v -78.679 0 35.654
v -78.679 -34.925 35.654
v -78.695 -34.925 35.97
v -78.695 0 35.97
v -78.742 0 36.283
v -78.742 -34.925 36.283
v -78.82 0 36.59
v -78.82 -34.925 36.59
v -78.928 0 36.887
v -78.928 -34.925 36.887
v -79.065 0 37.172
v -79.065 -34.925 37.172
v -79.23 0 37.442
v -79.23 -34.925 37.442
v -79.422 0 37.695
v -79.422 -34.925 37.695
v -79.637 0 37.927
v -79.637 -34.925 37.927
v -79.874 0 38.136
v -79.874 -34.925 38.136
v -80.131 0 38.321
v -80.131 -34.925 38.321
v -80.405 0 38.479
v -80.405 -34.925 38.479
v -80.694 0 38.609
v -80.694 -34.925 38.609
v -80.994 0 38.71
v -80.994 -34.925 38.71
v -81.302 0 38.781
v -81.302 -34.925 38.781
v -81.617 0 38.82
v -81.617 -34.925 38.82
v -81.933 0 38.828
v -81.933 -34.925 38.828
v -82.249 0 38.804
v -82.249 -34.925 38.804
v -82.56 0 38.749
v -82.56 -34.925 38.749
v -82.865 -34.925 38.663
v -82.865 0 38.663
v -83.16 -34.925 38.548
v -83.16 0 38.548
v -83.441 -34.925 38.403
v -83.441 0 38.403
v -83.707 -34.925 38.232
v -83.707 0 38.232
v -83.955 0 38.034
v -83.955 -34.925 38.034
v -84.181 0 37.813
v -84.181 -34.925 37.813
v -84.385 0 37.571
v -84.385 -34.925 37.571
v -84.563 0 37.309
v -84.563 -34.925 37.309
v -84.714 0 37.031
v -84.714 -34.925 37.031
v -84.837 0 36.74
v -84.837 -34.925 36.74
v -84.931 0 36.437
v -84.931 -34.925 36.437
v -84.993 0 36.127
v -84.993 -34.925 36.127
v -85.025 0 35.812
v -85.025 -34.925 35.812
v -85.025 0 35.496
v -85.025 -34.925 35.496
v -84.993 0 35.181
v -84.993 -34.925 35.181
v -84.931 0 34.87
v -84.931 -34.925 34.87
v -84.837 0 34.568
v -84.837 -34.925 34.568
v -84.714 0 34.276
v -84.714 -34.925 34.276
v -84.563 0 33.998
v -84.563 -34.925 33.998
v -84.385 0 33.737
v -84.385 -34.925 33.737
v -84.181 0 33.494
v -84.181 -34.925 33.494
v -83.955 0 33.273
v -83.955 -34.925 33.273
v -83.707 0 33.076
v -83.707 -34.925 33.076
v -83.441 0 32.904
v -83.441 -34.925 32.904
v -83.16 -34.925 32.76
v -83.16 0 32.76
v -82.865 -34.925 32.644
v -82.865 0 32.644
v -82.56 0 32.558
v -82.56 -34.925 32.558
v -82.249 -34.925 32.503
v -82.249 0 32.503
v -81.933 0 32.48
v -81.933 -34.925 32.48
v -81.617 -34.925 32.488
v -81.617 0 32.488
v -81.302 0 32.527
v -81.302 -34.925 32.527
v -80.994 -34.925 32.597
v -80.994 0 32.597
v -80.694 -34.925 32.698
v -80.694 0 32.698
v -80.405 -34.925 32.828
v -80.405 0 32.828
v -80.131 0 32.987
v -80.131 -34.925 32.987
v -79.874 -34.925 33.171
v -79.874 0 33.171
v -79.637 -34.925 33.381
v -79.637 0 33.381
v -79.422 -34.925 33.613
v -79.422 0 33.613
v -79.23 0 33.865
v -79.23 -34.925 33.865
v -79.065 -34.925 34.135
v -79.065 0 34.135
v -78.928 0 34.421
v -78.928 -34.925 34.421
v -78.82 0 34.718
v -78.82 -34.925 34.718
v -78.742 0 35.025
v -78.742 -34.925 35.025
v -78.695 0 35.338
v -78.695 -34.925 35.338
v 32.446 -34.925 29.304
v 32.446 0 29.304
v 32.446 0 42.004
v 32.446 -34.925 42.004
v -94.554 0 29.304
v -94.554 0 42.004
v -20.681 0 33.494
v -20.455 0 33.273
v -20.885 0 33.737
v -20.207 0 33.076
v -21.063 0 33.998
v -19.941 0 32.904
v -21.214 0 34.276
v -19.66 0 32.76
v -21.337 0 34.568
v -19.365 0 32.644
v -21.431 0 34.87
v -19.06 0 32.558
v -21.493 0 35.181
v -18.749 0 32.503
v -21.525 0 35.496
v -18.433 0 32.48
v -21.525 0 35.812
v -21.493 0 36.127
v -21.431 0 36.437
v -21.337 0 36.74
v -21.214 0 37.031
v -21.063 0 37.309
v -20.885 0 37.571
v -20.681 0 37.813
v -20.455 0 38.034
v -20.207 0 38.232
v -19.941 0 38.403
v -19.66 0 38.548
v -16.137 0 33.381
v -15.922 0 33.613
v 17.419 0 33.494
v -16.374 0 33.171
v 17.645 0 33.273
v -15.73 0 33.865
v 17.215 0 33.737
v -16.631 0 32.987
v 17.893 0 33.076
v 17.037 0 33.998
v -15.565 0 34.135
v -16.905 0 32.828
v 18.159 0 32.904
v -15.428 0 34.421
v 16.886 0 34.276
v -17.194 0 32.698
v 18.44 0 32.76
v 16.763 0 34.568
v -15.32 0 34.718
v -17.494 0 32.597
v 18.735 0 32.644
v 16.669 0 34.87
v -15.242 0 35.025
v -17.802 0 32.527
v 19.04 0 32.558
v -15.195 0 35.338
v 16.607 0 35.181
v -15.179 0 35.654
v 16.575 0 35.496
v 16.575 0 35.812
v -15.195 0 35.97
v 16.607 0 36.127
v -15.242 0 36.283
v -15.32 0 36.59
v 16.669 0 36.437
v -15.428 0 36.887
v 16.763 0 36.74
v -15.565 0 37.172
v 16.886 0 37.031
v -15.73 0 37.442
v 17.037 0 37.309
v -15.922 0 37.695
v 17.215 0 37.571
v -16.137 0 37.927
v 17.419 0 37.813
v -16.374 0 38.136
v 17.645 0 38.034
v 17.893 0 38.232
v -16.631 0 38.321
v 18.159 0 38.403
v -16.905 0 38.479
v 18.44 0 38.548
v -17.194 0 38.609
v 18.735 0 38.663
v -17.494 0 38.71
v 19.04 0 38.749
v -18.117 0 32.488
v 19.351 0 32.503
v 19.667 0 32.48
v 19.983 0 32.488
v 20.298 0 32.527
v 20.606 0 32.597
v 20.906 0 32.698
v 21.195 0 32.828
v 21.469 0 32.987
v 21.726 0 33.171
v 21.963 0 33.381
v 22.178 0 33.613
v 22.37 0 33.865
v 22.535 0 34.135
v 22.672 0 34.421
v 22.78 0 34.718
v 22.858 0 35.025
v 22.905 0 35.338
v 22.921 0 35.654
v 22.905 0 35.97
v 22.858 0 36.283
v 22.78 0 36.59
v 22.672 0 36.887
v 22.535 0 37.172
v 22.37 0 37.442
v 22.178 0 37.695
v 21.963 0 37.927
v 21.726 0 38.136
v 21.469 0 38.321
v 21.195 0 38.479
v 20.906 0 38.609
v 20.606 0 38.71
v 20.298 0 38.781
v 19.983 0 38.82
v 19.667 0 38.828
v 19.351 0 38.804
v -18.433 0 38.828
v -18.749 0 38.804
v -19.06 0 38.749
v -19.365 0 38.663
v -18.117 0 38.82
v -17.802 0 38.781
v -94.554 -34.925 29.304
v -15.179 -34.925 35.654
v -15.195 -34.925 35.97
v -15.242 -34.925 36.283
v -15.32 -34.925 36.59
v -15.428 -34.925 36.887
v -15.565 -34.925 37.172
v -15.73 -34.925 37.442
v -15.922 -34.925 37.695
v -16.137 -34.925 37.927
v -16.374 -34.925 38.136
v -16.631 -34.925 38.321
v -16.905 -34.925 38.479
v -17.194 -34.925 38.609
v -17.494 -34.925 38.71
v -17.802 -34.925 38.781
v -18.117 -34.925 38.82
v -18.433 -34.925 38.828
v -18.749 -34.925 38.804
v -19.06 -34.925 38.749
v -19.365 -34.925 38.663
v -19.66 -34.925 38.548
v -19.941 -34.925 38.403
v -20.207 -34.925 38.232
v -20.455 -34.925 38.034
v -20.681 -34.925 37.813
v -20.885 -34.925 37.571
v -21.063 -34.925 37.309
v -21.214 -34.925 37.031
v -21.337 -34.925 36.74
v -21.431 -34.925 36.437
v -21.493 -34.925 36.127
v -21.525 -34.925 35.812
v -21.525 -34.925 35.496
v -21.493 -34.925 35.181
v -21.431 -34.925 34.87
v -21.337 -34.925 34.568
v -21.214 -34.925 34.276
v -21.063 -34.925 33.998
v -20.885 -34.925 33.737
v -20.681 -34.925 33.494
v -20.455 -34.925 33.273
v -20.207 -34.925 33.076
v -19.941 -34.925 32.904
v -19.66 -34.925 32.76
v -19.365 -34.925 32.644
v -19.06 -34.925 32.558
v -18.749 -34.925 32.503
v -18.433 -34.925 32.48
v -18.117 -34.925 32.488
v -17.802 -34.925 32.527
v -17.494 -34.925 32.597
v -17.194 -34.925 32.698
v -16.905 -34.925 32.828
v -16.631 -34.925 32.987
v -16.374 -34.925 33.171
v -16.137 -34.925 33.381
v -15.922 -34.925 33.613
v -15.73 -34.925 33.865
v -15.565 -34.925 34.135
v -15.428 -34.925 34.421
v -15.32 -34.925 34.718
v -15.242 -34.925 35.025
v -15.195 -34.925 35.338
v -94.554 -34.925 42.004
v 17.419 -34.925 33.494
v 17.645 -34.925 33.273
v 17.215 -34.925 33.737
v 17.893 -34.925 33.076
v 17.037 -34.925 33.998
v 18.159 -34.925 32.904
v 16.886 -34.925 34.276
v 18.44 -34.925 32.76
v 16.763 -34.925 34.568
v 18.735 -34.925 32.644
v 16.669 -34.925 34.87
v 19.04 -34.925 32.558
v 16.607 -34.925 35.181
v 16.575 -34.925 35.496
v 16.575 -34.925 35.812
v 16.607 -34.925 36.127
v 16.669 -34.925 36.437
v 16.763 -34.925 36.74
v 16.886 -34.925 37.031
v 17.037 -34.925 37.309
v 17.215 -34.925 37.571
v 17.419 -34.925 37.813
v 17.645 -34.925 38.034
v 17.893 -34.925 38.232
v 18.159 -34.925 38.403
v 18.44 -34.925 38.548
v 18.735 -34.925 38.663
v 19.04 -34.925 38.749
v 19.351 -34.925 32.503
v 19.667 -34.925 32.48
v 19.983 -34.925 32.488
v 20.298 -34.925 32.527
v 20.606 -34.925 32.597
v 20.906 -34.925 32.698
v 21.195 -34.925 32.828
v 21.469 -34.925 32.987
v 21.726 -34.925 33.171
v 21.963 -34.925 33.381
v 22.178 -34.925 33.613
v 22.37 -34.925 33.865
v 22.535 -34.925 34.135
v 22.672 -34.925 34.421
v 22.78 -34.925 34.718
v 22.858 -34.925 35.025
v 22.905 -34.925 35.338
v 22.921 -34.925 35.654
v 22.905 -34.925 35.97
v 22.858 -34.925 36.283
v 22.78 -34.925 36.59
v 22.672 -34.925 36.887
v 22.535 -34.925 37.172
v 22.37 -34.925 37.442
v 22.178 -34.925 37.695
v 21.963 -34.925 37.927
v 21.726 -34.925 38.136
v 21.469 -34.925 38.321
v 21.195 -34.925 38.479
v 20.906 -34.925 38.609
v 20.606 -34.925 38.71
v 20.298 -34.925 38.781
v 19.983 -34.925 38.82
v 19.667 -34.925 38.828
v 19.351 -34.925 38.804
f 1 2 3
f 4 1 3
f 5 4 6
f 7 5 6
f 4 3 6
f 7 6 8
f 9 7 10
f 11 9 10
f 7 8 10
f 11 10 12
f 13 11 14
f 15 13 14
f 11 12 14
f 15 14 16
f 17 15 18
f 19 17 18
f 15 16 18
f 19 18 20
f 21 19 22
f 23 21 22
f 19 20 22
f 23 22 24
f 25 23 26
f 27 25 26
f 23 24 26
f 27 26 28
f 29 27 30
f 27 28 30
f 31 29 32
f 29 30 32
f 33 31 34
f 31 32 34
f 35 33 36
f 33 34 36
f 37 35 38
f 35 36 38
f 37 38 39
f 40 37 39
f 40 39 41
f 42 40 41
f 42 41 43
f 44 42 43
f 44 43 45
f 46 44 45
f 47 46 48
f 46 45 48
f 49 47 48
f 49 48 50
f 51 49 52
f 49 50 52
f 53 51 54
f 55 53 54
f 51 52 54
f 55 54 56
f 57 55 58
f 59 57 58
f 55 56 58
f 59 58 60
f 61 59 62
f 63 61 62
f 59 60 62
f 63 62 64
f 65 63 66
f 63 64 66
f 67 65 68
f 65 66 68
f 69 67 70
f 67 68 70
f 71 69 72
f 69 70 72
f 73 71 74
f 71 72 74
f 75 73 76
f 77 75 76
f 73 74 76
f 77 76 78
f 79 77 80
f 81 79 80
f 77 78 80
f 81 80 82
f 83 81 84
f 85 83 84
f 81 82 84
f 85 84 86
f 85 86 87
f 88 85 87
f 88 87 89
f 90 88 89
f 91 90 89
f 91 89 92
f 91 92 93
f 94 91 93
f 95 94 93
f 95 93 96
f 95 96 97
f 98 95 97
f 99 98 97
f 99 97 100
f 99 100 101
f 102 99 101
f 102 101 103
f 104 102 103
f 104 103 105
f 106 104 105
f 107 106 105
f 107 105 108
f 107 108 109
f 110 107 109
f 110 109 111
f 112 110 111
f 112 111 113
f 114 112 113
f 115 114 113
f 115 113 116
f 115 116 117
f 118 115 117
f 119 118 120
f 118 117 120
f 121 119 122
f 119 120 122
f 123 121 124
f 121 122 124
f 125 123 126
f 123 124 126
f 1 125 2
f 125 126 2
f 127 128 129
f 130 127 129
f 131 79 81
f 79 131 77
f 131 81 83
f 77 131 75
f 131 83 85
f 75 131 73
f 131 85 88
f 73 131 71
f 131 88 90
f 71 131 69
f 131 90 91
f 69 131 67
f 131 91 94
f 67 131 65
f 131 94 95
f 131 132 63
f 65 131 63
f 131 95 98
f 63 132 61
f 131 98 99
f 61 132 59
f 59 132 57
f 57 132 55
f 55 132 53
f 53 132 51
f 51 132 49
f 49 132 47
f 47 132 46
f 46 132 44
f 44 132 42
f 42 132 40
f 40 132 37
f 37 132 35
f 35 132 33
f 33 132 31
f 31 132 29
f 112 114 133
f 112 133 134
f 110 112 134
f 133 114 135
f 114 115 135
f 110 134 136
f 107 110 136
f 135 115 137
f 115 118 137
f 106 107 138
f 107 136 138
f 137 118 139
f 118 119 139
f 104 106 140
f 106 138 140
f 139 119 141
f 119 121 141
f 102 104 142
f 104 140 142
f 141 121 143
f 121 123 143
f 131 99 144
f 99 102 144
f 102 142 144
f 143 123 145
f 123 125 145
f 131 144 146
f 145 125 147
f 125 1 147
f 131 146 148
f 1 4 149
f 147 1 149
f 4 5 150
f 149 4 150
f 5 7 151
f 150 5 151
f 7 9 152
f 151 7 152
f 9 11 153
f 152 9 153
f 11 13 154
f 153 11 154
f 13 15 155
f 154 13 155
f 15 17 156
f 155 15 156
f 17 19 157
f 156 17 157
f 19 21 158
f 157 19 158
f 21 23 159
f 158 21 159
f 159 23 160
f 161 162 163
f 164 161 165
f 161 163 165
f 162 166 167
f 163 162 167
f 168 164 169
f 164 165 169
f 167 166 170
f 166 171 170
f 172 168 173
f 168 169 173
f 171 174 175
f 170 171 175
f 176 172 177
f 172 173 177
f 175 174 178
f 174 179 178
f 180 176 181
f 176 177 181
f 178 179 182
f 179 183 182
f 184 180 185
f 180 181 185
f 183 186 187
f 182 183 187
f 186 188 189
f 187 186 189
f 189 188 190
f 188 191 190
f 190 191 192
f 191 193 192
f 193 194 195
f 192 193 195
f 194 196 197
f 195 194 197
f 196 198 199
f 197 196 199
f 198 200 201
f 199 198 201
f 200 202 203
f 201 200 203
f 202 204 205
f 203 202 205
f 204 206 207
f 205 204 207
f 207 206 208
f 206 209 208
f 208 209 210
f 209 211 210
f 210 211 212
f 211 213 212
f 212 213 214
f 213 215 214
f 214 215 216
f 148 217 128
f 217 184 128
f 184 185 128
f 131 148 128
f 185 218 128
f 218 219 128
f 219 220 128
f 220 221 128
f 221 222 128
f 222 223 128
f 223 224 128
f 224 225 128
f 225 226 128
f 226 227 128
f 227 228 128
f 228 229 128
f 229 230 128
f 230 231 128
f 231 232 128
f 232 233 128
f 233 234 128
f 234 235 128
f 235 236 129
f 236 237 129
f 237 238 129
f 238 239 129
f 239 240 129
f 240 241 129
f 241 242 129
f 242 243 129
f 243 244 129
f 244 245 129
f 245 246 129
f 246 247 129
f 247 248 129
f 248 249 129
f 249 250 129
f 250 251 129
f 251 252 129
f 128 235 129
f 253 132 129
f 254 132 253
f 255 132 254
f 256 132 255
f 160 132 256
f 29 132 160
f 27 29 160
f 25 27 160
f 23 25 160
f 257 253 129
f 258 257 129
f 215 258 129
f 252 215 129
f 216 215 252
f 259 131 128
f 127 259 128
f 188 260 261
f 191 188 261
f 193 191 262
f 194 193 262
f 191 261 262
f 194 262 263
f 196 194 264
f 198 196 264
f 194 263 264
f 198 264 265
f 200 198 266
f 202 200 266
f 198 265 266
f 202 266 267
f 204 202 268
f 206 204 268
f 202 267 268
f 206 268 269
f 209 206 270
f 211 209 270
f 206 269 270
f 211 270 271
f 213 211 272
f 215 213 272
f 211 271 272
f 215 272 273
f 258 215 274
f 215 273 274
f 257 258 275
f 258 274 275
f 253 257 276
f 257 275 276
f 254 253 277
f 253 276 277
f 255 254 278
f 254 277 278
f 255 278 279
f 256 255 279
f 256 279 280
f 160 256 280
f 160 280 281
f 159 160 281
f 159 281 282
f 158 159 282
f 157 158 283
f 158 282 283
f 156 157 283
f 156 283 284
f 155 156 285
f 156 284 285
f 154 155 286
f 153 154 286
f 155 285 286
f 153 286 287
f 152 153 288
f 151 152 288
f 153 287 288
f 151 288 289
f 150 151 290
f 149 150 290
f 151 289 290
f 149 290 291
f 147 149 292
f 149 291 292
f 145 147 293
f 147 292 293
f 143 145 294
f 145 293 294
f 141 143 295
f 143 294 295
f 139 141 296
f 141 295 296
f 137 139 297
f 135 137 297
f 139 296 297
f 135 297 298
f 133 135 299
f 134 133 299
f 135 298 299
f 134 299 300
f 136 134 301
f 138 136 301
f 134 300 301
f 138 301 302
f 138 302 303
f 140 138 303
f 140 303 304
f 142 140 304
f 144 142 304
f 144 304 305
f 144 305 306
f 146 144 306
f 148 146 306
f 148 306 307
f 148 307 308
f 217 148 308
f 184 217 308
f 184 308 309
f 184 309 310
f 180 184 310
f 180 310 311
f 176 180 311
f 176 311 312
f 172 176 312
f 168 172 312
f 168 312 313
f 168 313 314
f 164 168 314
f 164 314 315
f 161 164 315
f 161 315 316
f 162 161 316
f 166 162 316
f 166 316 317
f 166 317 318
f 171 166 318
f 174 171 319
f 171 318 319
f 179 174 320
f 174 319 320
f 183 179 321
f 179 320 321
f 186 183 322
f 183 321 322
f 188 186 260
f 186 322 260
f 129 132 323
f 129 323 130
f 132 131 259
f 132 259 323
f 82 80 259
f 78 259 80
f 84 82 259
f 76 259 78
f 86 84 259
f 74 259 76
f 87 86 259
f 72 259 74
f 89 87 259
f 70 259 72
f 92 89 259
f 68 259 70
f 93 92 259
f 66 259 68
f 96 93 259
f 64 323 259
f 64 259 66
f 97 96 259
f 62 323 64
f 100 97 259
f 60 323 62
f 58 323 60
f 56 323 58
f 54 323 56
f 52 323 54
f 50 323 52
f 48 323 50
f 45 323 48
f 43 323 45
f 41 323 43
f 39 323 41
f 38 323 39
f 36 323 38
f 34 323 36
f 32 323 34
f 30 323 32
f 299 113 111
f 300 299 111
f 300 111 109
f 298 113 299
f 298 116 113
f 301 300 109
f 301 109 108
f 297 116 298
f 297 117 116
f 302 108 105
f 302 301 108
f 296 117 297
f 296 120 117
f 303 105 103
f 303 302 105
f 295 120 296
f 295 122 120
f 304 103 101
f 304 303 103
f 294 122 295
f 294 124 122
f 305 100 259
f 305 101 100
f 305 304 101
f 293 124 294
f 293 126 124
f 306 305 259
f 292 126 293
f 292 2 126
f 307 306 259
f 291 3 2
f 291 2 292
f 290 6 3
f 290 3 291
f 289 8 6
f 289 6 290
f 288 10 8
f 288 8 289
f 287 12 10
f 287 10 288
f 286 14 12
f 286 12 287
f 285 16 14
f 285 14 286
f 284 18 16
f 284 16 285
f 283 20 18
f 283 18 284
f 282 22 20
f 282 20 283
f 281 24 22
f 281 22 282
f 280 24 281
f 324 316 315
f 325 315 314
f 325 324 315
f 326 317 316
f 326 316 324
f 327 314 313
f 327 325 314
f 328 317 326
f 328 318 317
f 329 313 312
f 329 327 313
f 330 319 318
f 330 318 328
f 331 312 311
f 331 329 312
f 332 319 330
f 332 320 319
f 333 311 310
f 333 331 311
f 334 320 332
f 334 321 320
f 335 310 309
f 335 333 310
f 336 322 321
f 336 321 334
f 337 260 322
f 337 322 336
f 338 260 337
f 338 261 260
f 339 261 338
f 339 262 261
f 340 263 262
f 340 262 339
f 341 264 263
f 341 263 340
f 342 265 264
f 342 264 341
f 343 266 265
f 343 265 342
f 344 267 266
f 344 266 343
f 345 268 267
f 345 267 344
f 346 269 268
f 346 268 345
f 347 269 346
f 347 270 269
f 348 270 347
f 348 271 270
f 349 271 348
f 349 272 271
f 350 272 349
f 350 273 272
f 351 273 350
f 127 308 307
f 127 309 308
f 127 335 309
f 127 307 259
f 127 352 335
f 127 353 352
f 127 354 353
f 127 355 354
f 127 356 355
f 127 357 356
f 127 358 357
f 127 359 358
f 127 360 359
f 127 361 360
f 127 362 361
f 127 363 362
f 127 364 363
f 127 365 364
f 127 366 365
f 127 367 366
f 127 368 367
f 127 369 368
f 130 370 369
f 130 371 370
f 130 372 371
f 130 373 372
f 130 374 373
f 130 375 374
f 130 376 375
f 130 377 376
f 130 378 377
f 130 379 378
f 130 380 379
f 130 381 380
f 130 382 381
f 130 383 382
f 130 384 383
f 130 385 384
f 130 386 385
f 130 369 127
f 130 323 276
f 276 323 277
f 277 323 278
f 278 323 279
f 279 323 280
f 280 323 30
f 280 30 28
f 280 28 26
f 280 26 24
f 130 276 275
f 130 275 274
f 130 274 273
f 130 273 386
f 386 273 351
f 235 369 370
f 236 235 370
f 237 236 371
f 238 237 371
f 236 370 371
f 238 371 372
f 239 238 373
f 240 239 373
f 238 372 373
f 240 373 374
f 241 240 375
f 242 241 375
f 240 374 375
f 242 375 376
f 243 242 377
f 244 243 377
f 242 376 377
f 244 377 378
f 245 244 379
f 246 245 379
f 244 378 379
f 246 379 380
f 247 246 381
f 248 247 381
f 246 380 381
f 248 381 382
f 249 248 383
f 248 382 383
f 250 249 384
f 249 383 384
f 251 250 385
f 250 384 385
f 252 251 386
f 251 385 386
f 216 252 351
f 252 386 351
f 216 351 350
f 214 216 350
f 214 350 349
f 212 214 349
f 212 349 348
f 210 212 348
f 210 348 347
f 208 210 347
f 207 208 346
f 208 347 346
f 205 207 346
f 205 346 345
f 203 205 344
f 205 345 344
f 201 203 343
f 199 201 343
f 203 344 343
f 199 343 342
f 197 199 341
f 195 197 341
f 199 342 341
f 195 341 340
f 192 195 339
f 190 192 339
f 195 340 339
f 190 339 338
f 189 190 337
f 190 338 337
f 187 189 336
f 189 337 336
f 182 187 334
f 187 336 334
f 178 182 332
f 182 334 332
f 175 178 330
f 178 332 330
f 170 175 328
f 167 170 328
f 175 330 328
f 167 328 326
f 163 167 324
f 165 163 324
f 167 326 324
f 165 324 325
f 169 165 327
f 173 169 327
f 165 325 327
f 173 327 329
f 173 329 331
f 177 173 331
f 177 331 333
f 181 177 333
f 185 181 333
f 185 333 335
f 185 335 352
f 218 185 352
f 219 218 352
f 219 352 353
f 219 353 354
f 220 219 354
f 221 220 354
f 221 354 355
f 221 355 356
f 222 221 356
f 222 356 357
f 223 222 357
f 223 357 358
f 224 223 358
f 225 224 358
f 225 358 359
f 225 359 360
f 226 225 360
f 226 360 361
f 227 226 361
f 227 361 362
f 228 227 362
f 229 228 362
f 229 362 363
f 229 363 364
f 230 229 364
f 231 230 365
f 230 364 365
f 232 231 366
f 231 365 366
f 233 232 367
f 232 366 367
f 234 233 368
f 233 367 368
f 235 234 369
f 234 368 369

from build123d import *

# Parameters (mm, degrees)
F0_W     = 127
F0_H     = 12.7
F1_DEPTH = 34.925
F2_R     = 3.175
F3_DEPTH = 34.925


# Not quite as in the source:
# - a feature names something its author has since deleted; it is built from what else it names


with BuildPart() as f1:
    # F0 (on Front) → F1 (new body)
    with BuildSketch(Plane.XZ):
        with Locations((-31.0538060308, 35.6538111673)):
            Rectangle(F0_W, F0_H)
    extrude(amount=F1_DEPTH)

    # F2 (on face) → F3 (cut)
    with BuildSketch(Plane.XZ.offset(34.925)):
        with Locations((-81.8538060308, 35.6538111673)):
            Circle(F2_R)
        with Locations((-18.3538060308, 35.6538111673)):
            Circle(F2_R)
        with Locations((19.7461939692, 35.6538111673)):
            Circle(F2_R)
    extrude(amount=-F3_DEPTH, mode=Mode.SUBTRACT)


solid = f1.part
